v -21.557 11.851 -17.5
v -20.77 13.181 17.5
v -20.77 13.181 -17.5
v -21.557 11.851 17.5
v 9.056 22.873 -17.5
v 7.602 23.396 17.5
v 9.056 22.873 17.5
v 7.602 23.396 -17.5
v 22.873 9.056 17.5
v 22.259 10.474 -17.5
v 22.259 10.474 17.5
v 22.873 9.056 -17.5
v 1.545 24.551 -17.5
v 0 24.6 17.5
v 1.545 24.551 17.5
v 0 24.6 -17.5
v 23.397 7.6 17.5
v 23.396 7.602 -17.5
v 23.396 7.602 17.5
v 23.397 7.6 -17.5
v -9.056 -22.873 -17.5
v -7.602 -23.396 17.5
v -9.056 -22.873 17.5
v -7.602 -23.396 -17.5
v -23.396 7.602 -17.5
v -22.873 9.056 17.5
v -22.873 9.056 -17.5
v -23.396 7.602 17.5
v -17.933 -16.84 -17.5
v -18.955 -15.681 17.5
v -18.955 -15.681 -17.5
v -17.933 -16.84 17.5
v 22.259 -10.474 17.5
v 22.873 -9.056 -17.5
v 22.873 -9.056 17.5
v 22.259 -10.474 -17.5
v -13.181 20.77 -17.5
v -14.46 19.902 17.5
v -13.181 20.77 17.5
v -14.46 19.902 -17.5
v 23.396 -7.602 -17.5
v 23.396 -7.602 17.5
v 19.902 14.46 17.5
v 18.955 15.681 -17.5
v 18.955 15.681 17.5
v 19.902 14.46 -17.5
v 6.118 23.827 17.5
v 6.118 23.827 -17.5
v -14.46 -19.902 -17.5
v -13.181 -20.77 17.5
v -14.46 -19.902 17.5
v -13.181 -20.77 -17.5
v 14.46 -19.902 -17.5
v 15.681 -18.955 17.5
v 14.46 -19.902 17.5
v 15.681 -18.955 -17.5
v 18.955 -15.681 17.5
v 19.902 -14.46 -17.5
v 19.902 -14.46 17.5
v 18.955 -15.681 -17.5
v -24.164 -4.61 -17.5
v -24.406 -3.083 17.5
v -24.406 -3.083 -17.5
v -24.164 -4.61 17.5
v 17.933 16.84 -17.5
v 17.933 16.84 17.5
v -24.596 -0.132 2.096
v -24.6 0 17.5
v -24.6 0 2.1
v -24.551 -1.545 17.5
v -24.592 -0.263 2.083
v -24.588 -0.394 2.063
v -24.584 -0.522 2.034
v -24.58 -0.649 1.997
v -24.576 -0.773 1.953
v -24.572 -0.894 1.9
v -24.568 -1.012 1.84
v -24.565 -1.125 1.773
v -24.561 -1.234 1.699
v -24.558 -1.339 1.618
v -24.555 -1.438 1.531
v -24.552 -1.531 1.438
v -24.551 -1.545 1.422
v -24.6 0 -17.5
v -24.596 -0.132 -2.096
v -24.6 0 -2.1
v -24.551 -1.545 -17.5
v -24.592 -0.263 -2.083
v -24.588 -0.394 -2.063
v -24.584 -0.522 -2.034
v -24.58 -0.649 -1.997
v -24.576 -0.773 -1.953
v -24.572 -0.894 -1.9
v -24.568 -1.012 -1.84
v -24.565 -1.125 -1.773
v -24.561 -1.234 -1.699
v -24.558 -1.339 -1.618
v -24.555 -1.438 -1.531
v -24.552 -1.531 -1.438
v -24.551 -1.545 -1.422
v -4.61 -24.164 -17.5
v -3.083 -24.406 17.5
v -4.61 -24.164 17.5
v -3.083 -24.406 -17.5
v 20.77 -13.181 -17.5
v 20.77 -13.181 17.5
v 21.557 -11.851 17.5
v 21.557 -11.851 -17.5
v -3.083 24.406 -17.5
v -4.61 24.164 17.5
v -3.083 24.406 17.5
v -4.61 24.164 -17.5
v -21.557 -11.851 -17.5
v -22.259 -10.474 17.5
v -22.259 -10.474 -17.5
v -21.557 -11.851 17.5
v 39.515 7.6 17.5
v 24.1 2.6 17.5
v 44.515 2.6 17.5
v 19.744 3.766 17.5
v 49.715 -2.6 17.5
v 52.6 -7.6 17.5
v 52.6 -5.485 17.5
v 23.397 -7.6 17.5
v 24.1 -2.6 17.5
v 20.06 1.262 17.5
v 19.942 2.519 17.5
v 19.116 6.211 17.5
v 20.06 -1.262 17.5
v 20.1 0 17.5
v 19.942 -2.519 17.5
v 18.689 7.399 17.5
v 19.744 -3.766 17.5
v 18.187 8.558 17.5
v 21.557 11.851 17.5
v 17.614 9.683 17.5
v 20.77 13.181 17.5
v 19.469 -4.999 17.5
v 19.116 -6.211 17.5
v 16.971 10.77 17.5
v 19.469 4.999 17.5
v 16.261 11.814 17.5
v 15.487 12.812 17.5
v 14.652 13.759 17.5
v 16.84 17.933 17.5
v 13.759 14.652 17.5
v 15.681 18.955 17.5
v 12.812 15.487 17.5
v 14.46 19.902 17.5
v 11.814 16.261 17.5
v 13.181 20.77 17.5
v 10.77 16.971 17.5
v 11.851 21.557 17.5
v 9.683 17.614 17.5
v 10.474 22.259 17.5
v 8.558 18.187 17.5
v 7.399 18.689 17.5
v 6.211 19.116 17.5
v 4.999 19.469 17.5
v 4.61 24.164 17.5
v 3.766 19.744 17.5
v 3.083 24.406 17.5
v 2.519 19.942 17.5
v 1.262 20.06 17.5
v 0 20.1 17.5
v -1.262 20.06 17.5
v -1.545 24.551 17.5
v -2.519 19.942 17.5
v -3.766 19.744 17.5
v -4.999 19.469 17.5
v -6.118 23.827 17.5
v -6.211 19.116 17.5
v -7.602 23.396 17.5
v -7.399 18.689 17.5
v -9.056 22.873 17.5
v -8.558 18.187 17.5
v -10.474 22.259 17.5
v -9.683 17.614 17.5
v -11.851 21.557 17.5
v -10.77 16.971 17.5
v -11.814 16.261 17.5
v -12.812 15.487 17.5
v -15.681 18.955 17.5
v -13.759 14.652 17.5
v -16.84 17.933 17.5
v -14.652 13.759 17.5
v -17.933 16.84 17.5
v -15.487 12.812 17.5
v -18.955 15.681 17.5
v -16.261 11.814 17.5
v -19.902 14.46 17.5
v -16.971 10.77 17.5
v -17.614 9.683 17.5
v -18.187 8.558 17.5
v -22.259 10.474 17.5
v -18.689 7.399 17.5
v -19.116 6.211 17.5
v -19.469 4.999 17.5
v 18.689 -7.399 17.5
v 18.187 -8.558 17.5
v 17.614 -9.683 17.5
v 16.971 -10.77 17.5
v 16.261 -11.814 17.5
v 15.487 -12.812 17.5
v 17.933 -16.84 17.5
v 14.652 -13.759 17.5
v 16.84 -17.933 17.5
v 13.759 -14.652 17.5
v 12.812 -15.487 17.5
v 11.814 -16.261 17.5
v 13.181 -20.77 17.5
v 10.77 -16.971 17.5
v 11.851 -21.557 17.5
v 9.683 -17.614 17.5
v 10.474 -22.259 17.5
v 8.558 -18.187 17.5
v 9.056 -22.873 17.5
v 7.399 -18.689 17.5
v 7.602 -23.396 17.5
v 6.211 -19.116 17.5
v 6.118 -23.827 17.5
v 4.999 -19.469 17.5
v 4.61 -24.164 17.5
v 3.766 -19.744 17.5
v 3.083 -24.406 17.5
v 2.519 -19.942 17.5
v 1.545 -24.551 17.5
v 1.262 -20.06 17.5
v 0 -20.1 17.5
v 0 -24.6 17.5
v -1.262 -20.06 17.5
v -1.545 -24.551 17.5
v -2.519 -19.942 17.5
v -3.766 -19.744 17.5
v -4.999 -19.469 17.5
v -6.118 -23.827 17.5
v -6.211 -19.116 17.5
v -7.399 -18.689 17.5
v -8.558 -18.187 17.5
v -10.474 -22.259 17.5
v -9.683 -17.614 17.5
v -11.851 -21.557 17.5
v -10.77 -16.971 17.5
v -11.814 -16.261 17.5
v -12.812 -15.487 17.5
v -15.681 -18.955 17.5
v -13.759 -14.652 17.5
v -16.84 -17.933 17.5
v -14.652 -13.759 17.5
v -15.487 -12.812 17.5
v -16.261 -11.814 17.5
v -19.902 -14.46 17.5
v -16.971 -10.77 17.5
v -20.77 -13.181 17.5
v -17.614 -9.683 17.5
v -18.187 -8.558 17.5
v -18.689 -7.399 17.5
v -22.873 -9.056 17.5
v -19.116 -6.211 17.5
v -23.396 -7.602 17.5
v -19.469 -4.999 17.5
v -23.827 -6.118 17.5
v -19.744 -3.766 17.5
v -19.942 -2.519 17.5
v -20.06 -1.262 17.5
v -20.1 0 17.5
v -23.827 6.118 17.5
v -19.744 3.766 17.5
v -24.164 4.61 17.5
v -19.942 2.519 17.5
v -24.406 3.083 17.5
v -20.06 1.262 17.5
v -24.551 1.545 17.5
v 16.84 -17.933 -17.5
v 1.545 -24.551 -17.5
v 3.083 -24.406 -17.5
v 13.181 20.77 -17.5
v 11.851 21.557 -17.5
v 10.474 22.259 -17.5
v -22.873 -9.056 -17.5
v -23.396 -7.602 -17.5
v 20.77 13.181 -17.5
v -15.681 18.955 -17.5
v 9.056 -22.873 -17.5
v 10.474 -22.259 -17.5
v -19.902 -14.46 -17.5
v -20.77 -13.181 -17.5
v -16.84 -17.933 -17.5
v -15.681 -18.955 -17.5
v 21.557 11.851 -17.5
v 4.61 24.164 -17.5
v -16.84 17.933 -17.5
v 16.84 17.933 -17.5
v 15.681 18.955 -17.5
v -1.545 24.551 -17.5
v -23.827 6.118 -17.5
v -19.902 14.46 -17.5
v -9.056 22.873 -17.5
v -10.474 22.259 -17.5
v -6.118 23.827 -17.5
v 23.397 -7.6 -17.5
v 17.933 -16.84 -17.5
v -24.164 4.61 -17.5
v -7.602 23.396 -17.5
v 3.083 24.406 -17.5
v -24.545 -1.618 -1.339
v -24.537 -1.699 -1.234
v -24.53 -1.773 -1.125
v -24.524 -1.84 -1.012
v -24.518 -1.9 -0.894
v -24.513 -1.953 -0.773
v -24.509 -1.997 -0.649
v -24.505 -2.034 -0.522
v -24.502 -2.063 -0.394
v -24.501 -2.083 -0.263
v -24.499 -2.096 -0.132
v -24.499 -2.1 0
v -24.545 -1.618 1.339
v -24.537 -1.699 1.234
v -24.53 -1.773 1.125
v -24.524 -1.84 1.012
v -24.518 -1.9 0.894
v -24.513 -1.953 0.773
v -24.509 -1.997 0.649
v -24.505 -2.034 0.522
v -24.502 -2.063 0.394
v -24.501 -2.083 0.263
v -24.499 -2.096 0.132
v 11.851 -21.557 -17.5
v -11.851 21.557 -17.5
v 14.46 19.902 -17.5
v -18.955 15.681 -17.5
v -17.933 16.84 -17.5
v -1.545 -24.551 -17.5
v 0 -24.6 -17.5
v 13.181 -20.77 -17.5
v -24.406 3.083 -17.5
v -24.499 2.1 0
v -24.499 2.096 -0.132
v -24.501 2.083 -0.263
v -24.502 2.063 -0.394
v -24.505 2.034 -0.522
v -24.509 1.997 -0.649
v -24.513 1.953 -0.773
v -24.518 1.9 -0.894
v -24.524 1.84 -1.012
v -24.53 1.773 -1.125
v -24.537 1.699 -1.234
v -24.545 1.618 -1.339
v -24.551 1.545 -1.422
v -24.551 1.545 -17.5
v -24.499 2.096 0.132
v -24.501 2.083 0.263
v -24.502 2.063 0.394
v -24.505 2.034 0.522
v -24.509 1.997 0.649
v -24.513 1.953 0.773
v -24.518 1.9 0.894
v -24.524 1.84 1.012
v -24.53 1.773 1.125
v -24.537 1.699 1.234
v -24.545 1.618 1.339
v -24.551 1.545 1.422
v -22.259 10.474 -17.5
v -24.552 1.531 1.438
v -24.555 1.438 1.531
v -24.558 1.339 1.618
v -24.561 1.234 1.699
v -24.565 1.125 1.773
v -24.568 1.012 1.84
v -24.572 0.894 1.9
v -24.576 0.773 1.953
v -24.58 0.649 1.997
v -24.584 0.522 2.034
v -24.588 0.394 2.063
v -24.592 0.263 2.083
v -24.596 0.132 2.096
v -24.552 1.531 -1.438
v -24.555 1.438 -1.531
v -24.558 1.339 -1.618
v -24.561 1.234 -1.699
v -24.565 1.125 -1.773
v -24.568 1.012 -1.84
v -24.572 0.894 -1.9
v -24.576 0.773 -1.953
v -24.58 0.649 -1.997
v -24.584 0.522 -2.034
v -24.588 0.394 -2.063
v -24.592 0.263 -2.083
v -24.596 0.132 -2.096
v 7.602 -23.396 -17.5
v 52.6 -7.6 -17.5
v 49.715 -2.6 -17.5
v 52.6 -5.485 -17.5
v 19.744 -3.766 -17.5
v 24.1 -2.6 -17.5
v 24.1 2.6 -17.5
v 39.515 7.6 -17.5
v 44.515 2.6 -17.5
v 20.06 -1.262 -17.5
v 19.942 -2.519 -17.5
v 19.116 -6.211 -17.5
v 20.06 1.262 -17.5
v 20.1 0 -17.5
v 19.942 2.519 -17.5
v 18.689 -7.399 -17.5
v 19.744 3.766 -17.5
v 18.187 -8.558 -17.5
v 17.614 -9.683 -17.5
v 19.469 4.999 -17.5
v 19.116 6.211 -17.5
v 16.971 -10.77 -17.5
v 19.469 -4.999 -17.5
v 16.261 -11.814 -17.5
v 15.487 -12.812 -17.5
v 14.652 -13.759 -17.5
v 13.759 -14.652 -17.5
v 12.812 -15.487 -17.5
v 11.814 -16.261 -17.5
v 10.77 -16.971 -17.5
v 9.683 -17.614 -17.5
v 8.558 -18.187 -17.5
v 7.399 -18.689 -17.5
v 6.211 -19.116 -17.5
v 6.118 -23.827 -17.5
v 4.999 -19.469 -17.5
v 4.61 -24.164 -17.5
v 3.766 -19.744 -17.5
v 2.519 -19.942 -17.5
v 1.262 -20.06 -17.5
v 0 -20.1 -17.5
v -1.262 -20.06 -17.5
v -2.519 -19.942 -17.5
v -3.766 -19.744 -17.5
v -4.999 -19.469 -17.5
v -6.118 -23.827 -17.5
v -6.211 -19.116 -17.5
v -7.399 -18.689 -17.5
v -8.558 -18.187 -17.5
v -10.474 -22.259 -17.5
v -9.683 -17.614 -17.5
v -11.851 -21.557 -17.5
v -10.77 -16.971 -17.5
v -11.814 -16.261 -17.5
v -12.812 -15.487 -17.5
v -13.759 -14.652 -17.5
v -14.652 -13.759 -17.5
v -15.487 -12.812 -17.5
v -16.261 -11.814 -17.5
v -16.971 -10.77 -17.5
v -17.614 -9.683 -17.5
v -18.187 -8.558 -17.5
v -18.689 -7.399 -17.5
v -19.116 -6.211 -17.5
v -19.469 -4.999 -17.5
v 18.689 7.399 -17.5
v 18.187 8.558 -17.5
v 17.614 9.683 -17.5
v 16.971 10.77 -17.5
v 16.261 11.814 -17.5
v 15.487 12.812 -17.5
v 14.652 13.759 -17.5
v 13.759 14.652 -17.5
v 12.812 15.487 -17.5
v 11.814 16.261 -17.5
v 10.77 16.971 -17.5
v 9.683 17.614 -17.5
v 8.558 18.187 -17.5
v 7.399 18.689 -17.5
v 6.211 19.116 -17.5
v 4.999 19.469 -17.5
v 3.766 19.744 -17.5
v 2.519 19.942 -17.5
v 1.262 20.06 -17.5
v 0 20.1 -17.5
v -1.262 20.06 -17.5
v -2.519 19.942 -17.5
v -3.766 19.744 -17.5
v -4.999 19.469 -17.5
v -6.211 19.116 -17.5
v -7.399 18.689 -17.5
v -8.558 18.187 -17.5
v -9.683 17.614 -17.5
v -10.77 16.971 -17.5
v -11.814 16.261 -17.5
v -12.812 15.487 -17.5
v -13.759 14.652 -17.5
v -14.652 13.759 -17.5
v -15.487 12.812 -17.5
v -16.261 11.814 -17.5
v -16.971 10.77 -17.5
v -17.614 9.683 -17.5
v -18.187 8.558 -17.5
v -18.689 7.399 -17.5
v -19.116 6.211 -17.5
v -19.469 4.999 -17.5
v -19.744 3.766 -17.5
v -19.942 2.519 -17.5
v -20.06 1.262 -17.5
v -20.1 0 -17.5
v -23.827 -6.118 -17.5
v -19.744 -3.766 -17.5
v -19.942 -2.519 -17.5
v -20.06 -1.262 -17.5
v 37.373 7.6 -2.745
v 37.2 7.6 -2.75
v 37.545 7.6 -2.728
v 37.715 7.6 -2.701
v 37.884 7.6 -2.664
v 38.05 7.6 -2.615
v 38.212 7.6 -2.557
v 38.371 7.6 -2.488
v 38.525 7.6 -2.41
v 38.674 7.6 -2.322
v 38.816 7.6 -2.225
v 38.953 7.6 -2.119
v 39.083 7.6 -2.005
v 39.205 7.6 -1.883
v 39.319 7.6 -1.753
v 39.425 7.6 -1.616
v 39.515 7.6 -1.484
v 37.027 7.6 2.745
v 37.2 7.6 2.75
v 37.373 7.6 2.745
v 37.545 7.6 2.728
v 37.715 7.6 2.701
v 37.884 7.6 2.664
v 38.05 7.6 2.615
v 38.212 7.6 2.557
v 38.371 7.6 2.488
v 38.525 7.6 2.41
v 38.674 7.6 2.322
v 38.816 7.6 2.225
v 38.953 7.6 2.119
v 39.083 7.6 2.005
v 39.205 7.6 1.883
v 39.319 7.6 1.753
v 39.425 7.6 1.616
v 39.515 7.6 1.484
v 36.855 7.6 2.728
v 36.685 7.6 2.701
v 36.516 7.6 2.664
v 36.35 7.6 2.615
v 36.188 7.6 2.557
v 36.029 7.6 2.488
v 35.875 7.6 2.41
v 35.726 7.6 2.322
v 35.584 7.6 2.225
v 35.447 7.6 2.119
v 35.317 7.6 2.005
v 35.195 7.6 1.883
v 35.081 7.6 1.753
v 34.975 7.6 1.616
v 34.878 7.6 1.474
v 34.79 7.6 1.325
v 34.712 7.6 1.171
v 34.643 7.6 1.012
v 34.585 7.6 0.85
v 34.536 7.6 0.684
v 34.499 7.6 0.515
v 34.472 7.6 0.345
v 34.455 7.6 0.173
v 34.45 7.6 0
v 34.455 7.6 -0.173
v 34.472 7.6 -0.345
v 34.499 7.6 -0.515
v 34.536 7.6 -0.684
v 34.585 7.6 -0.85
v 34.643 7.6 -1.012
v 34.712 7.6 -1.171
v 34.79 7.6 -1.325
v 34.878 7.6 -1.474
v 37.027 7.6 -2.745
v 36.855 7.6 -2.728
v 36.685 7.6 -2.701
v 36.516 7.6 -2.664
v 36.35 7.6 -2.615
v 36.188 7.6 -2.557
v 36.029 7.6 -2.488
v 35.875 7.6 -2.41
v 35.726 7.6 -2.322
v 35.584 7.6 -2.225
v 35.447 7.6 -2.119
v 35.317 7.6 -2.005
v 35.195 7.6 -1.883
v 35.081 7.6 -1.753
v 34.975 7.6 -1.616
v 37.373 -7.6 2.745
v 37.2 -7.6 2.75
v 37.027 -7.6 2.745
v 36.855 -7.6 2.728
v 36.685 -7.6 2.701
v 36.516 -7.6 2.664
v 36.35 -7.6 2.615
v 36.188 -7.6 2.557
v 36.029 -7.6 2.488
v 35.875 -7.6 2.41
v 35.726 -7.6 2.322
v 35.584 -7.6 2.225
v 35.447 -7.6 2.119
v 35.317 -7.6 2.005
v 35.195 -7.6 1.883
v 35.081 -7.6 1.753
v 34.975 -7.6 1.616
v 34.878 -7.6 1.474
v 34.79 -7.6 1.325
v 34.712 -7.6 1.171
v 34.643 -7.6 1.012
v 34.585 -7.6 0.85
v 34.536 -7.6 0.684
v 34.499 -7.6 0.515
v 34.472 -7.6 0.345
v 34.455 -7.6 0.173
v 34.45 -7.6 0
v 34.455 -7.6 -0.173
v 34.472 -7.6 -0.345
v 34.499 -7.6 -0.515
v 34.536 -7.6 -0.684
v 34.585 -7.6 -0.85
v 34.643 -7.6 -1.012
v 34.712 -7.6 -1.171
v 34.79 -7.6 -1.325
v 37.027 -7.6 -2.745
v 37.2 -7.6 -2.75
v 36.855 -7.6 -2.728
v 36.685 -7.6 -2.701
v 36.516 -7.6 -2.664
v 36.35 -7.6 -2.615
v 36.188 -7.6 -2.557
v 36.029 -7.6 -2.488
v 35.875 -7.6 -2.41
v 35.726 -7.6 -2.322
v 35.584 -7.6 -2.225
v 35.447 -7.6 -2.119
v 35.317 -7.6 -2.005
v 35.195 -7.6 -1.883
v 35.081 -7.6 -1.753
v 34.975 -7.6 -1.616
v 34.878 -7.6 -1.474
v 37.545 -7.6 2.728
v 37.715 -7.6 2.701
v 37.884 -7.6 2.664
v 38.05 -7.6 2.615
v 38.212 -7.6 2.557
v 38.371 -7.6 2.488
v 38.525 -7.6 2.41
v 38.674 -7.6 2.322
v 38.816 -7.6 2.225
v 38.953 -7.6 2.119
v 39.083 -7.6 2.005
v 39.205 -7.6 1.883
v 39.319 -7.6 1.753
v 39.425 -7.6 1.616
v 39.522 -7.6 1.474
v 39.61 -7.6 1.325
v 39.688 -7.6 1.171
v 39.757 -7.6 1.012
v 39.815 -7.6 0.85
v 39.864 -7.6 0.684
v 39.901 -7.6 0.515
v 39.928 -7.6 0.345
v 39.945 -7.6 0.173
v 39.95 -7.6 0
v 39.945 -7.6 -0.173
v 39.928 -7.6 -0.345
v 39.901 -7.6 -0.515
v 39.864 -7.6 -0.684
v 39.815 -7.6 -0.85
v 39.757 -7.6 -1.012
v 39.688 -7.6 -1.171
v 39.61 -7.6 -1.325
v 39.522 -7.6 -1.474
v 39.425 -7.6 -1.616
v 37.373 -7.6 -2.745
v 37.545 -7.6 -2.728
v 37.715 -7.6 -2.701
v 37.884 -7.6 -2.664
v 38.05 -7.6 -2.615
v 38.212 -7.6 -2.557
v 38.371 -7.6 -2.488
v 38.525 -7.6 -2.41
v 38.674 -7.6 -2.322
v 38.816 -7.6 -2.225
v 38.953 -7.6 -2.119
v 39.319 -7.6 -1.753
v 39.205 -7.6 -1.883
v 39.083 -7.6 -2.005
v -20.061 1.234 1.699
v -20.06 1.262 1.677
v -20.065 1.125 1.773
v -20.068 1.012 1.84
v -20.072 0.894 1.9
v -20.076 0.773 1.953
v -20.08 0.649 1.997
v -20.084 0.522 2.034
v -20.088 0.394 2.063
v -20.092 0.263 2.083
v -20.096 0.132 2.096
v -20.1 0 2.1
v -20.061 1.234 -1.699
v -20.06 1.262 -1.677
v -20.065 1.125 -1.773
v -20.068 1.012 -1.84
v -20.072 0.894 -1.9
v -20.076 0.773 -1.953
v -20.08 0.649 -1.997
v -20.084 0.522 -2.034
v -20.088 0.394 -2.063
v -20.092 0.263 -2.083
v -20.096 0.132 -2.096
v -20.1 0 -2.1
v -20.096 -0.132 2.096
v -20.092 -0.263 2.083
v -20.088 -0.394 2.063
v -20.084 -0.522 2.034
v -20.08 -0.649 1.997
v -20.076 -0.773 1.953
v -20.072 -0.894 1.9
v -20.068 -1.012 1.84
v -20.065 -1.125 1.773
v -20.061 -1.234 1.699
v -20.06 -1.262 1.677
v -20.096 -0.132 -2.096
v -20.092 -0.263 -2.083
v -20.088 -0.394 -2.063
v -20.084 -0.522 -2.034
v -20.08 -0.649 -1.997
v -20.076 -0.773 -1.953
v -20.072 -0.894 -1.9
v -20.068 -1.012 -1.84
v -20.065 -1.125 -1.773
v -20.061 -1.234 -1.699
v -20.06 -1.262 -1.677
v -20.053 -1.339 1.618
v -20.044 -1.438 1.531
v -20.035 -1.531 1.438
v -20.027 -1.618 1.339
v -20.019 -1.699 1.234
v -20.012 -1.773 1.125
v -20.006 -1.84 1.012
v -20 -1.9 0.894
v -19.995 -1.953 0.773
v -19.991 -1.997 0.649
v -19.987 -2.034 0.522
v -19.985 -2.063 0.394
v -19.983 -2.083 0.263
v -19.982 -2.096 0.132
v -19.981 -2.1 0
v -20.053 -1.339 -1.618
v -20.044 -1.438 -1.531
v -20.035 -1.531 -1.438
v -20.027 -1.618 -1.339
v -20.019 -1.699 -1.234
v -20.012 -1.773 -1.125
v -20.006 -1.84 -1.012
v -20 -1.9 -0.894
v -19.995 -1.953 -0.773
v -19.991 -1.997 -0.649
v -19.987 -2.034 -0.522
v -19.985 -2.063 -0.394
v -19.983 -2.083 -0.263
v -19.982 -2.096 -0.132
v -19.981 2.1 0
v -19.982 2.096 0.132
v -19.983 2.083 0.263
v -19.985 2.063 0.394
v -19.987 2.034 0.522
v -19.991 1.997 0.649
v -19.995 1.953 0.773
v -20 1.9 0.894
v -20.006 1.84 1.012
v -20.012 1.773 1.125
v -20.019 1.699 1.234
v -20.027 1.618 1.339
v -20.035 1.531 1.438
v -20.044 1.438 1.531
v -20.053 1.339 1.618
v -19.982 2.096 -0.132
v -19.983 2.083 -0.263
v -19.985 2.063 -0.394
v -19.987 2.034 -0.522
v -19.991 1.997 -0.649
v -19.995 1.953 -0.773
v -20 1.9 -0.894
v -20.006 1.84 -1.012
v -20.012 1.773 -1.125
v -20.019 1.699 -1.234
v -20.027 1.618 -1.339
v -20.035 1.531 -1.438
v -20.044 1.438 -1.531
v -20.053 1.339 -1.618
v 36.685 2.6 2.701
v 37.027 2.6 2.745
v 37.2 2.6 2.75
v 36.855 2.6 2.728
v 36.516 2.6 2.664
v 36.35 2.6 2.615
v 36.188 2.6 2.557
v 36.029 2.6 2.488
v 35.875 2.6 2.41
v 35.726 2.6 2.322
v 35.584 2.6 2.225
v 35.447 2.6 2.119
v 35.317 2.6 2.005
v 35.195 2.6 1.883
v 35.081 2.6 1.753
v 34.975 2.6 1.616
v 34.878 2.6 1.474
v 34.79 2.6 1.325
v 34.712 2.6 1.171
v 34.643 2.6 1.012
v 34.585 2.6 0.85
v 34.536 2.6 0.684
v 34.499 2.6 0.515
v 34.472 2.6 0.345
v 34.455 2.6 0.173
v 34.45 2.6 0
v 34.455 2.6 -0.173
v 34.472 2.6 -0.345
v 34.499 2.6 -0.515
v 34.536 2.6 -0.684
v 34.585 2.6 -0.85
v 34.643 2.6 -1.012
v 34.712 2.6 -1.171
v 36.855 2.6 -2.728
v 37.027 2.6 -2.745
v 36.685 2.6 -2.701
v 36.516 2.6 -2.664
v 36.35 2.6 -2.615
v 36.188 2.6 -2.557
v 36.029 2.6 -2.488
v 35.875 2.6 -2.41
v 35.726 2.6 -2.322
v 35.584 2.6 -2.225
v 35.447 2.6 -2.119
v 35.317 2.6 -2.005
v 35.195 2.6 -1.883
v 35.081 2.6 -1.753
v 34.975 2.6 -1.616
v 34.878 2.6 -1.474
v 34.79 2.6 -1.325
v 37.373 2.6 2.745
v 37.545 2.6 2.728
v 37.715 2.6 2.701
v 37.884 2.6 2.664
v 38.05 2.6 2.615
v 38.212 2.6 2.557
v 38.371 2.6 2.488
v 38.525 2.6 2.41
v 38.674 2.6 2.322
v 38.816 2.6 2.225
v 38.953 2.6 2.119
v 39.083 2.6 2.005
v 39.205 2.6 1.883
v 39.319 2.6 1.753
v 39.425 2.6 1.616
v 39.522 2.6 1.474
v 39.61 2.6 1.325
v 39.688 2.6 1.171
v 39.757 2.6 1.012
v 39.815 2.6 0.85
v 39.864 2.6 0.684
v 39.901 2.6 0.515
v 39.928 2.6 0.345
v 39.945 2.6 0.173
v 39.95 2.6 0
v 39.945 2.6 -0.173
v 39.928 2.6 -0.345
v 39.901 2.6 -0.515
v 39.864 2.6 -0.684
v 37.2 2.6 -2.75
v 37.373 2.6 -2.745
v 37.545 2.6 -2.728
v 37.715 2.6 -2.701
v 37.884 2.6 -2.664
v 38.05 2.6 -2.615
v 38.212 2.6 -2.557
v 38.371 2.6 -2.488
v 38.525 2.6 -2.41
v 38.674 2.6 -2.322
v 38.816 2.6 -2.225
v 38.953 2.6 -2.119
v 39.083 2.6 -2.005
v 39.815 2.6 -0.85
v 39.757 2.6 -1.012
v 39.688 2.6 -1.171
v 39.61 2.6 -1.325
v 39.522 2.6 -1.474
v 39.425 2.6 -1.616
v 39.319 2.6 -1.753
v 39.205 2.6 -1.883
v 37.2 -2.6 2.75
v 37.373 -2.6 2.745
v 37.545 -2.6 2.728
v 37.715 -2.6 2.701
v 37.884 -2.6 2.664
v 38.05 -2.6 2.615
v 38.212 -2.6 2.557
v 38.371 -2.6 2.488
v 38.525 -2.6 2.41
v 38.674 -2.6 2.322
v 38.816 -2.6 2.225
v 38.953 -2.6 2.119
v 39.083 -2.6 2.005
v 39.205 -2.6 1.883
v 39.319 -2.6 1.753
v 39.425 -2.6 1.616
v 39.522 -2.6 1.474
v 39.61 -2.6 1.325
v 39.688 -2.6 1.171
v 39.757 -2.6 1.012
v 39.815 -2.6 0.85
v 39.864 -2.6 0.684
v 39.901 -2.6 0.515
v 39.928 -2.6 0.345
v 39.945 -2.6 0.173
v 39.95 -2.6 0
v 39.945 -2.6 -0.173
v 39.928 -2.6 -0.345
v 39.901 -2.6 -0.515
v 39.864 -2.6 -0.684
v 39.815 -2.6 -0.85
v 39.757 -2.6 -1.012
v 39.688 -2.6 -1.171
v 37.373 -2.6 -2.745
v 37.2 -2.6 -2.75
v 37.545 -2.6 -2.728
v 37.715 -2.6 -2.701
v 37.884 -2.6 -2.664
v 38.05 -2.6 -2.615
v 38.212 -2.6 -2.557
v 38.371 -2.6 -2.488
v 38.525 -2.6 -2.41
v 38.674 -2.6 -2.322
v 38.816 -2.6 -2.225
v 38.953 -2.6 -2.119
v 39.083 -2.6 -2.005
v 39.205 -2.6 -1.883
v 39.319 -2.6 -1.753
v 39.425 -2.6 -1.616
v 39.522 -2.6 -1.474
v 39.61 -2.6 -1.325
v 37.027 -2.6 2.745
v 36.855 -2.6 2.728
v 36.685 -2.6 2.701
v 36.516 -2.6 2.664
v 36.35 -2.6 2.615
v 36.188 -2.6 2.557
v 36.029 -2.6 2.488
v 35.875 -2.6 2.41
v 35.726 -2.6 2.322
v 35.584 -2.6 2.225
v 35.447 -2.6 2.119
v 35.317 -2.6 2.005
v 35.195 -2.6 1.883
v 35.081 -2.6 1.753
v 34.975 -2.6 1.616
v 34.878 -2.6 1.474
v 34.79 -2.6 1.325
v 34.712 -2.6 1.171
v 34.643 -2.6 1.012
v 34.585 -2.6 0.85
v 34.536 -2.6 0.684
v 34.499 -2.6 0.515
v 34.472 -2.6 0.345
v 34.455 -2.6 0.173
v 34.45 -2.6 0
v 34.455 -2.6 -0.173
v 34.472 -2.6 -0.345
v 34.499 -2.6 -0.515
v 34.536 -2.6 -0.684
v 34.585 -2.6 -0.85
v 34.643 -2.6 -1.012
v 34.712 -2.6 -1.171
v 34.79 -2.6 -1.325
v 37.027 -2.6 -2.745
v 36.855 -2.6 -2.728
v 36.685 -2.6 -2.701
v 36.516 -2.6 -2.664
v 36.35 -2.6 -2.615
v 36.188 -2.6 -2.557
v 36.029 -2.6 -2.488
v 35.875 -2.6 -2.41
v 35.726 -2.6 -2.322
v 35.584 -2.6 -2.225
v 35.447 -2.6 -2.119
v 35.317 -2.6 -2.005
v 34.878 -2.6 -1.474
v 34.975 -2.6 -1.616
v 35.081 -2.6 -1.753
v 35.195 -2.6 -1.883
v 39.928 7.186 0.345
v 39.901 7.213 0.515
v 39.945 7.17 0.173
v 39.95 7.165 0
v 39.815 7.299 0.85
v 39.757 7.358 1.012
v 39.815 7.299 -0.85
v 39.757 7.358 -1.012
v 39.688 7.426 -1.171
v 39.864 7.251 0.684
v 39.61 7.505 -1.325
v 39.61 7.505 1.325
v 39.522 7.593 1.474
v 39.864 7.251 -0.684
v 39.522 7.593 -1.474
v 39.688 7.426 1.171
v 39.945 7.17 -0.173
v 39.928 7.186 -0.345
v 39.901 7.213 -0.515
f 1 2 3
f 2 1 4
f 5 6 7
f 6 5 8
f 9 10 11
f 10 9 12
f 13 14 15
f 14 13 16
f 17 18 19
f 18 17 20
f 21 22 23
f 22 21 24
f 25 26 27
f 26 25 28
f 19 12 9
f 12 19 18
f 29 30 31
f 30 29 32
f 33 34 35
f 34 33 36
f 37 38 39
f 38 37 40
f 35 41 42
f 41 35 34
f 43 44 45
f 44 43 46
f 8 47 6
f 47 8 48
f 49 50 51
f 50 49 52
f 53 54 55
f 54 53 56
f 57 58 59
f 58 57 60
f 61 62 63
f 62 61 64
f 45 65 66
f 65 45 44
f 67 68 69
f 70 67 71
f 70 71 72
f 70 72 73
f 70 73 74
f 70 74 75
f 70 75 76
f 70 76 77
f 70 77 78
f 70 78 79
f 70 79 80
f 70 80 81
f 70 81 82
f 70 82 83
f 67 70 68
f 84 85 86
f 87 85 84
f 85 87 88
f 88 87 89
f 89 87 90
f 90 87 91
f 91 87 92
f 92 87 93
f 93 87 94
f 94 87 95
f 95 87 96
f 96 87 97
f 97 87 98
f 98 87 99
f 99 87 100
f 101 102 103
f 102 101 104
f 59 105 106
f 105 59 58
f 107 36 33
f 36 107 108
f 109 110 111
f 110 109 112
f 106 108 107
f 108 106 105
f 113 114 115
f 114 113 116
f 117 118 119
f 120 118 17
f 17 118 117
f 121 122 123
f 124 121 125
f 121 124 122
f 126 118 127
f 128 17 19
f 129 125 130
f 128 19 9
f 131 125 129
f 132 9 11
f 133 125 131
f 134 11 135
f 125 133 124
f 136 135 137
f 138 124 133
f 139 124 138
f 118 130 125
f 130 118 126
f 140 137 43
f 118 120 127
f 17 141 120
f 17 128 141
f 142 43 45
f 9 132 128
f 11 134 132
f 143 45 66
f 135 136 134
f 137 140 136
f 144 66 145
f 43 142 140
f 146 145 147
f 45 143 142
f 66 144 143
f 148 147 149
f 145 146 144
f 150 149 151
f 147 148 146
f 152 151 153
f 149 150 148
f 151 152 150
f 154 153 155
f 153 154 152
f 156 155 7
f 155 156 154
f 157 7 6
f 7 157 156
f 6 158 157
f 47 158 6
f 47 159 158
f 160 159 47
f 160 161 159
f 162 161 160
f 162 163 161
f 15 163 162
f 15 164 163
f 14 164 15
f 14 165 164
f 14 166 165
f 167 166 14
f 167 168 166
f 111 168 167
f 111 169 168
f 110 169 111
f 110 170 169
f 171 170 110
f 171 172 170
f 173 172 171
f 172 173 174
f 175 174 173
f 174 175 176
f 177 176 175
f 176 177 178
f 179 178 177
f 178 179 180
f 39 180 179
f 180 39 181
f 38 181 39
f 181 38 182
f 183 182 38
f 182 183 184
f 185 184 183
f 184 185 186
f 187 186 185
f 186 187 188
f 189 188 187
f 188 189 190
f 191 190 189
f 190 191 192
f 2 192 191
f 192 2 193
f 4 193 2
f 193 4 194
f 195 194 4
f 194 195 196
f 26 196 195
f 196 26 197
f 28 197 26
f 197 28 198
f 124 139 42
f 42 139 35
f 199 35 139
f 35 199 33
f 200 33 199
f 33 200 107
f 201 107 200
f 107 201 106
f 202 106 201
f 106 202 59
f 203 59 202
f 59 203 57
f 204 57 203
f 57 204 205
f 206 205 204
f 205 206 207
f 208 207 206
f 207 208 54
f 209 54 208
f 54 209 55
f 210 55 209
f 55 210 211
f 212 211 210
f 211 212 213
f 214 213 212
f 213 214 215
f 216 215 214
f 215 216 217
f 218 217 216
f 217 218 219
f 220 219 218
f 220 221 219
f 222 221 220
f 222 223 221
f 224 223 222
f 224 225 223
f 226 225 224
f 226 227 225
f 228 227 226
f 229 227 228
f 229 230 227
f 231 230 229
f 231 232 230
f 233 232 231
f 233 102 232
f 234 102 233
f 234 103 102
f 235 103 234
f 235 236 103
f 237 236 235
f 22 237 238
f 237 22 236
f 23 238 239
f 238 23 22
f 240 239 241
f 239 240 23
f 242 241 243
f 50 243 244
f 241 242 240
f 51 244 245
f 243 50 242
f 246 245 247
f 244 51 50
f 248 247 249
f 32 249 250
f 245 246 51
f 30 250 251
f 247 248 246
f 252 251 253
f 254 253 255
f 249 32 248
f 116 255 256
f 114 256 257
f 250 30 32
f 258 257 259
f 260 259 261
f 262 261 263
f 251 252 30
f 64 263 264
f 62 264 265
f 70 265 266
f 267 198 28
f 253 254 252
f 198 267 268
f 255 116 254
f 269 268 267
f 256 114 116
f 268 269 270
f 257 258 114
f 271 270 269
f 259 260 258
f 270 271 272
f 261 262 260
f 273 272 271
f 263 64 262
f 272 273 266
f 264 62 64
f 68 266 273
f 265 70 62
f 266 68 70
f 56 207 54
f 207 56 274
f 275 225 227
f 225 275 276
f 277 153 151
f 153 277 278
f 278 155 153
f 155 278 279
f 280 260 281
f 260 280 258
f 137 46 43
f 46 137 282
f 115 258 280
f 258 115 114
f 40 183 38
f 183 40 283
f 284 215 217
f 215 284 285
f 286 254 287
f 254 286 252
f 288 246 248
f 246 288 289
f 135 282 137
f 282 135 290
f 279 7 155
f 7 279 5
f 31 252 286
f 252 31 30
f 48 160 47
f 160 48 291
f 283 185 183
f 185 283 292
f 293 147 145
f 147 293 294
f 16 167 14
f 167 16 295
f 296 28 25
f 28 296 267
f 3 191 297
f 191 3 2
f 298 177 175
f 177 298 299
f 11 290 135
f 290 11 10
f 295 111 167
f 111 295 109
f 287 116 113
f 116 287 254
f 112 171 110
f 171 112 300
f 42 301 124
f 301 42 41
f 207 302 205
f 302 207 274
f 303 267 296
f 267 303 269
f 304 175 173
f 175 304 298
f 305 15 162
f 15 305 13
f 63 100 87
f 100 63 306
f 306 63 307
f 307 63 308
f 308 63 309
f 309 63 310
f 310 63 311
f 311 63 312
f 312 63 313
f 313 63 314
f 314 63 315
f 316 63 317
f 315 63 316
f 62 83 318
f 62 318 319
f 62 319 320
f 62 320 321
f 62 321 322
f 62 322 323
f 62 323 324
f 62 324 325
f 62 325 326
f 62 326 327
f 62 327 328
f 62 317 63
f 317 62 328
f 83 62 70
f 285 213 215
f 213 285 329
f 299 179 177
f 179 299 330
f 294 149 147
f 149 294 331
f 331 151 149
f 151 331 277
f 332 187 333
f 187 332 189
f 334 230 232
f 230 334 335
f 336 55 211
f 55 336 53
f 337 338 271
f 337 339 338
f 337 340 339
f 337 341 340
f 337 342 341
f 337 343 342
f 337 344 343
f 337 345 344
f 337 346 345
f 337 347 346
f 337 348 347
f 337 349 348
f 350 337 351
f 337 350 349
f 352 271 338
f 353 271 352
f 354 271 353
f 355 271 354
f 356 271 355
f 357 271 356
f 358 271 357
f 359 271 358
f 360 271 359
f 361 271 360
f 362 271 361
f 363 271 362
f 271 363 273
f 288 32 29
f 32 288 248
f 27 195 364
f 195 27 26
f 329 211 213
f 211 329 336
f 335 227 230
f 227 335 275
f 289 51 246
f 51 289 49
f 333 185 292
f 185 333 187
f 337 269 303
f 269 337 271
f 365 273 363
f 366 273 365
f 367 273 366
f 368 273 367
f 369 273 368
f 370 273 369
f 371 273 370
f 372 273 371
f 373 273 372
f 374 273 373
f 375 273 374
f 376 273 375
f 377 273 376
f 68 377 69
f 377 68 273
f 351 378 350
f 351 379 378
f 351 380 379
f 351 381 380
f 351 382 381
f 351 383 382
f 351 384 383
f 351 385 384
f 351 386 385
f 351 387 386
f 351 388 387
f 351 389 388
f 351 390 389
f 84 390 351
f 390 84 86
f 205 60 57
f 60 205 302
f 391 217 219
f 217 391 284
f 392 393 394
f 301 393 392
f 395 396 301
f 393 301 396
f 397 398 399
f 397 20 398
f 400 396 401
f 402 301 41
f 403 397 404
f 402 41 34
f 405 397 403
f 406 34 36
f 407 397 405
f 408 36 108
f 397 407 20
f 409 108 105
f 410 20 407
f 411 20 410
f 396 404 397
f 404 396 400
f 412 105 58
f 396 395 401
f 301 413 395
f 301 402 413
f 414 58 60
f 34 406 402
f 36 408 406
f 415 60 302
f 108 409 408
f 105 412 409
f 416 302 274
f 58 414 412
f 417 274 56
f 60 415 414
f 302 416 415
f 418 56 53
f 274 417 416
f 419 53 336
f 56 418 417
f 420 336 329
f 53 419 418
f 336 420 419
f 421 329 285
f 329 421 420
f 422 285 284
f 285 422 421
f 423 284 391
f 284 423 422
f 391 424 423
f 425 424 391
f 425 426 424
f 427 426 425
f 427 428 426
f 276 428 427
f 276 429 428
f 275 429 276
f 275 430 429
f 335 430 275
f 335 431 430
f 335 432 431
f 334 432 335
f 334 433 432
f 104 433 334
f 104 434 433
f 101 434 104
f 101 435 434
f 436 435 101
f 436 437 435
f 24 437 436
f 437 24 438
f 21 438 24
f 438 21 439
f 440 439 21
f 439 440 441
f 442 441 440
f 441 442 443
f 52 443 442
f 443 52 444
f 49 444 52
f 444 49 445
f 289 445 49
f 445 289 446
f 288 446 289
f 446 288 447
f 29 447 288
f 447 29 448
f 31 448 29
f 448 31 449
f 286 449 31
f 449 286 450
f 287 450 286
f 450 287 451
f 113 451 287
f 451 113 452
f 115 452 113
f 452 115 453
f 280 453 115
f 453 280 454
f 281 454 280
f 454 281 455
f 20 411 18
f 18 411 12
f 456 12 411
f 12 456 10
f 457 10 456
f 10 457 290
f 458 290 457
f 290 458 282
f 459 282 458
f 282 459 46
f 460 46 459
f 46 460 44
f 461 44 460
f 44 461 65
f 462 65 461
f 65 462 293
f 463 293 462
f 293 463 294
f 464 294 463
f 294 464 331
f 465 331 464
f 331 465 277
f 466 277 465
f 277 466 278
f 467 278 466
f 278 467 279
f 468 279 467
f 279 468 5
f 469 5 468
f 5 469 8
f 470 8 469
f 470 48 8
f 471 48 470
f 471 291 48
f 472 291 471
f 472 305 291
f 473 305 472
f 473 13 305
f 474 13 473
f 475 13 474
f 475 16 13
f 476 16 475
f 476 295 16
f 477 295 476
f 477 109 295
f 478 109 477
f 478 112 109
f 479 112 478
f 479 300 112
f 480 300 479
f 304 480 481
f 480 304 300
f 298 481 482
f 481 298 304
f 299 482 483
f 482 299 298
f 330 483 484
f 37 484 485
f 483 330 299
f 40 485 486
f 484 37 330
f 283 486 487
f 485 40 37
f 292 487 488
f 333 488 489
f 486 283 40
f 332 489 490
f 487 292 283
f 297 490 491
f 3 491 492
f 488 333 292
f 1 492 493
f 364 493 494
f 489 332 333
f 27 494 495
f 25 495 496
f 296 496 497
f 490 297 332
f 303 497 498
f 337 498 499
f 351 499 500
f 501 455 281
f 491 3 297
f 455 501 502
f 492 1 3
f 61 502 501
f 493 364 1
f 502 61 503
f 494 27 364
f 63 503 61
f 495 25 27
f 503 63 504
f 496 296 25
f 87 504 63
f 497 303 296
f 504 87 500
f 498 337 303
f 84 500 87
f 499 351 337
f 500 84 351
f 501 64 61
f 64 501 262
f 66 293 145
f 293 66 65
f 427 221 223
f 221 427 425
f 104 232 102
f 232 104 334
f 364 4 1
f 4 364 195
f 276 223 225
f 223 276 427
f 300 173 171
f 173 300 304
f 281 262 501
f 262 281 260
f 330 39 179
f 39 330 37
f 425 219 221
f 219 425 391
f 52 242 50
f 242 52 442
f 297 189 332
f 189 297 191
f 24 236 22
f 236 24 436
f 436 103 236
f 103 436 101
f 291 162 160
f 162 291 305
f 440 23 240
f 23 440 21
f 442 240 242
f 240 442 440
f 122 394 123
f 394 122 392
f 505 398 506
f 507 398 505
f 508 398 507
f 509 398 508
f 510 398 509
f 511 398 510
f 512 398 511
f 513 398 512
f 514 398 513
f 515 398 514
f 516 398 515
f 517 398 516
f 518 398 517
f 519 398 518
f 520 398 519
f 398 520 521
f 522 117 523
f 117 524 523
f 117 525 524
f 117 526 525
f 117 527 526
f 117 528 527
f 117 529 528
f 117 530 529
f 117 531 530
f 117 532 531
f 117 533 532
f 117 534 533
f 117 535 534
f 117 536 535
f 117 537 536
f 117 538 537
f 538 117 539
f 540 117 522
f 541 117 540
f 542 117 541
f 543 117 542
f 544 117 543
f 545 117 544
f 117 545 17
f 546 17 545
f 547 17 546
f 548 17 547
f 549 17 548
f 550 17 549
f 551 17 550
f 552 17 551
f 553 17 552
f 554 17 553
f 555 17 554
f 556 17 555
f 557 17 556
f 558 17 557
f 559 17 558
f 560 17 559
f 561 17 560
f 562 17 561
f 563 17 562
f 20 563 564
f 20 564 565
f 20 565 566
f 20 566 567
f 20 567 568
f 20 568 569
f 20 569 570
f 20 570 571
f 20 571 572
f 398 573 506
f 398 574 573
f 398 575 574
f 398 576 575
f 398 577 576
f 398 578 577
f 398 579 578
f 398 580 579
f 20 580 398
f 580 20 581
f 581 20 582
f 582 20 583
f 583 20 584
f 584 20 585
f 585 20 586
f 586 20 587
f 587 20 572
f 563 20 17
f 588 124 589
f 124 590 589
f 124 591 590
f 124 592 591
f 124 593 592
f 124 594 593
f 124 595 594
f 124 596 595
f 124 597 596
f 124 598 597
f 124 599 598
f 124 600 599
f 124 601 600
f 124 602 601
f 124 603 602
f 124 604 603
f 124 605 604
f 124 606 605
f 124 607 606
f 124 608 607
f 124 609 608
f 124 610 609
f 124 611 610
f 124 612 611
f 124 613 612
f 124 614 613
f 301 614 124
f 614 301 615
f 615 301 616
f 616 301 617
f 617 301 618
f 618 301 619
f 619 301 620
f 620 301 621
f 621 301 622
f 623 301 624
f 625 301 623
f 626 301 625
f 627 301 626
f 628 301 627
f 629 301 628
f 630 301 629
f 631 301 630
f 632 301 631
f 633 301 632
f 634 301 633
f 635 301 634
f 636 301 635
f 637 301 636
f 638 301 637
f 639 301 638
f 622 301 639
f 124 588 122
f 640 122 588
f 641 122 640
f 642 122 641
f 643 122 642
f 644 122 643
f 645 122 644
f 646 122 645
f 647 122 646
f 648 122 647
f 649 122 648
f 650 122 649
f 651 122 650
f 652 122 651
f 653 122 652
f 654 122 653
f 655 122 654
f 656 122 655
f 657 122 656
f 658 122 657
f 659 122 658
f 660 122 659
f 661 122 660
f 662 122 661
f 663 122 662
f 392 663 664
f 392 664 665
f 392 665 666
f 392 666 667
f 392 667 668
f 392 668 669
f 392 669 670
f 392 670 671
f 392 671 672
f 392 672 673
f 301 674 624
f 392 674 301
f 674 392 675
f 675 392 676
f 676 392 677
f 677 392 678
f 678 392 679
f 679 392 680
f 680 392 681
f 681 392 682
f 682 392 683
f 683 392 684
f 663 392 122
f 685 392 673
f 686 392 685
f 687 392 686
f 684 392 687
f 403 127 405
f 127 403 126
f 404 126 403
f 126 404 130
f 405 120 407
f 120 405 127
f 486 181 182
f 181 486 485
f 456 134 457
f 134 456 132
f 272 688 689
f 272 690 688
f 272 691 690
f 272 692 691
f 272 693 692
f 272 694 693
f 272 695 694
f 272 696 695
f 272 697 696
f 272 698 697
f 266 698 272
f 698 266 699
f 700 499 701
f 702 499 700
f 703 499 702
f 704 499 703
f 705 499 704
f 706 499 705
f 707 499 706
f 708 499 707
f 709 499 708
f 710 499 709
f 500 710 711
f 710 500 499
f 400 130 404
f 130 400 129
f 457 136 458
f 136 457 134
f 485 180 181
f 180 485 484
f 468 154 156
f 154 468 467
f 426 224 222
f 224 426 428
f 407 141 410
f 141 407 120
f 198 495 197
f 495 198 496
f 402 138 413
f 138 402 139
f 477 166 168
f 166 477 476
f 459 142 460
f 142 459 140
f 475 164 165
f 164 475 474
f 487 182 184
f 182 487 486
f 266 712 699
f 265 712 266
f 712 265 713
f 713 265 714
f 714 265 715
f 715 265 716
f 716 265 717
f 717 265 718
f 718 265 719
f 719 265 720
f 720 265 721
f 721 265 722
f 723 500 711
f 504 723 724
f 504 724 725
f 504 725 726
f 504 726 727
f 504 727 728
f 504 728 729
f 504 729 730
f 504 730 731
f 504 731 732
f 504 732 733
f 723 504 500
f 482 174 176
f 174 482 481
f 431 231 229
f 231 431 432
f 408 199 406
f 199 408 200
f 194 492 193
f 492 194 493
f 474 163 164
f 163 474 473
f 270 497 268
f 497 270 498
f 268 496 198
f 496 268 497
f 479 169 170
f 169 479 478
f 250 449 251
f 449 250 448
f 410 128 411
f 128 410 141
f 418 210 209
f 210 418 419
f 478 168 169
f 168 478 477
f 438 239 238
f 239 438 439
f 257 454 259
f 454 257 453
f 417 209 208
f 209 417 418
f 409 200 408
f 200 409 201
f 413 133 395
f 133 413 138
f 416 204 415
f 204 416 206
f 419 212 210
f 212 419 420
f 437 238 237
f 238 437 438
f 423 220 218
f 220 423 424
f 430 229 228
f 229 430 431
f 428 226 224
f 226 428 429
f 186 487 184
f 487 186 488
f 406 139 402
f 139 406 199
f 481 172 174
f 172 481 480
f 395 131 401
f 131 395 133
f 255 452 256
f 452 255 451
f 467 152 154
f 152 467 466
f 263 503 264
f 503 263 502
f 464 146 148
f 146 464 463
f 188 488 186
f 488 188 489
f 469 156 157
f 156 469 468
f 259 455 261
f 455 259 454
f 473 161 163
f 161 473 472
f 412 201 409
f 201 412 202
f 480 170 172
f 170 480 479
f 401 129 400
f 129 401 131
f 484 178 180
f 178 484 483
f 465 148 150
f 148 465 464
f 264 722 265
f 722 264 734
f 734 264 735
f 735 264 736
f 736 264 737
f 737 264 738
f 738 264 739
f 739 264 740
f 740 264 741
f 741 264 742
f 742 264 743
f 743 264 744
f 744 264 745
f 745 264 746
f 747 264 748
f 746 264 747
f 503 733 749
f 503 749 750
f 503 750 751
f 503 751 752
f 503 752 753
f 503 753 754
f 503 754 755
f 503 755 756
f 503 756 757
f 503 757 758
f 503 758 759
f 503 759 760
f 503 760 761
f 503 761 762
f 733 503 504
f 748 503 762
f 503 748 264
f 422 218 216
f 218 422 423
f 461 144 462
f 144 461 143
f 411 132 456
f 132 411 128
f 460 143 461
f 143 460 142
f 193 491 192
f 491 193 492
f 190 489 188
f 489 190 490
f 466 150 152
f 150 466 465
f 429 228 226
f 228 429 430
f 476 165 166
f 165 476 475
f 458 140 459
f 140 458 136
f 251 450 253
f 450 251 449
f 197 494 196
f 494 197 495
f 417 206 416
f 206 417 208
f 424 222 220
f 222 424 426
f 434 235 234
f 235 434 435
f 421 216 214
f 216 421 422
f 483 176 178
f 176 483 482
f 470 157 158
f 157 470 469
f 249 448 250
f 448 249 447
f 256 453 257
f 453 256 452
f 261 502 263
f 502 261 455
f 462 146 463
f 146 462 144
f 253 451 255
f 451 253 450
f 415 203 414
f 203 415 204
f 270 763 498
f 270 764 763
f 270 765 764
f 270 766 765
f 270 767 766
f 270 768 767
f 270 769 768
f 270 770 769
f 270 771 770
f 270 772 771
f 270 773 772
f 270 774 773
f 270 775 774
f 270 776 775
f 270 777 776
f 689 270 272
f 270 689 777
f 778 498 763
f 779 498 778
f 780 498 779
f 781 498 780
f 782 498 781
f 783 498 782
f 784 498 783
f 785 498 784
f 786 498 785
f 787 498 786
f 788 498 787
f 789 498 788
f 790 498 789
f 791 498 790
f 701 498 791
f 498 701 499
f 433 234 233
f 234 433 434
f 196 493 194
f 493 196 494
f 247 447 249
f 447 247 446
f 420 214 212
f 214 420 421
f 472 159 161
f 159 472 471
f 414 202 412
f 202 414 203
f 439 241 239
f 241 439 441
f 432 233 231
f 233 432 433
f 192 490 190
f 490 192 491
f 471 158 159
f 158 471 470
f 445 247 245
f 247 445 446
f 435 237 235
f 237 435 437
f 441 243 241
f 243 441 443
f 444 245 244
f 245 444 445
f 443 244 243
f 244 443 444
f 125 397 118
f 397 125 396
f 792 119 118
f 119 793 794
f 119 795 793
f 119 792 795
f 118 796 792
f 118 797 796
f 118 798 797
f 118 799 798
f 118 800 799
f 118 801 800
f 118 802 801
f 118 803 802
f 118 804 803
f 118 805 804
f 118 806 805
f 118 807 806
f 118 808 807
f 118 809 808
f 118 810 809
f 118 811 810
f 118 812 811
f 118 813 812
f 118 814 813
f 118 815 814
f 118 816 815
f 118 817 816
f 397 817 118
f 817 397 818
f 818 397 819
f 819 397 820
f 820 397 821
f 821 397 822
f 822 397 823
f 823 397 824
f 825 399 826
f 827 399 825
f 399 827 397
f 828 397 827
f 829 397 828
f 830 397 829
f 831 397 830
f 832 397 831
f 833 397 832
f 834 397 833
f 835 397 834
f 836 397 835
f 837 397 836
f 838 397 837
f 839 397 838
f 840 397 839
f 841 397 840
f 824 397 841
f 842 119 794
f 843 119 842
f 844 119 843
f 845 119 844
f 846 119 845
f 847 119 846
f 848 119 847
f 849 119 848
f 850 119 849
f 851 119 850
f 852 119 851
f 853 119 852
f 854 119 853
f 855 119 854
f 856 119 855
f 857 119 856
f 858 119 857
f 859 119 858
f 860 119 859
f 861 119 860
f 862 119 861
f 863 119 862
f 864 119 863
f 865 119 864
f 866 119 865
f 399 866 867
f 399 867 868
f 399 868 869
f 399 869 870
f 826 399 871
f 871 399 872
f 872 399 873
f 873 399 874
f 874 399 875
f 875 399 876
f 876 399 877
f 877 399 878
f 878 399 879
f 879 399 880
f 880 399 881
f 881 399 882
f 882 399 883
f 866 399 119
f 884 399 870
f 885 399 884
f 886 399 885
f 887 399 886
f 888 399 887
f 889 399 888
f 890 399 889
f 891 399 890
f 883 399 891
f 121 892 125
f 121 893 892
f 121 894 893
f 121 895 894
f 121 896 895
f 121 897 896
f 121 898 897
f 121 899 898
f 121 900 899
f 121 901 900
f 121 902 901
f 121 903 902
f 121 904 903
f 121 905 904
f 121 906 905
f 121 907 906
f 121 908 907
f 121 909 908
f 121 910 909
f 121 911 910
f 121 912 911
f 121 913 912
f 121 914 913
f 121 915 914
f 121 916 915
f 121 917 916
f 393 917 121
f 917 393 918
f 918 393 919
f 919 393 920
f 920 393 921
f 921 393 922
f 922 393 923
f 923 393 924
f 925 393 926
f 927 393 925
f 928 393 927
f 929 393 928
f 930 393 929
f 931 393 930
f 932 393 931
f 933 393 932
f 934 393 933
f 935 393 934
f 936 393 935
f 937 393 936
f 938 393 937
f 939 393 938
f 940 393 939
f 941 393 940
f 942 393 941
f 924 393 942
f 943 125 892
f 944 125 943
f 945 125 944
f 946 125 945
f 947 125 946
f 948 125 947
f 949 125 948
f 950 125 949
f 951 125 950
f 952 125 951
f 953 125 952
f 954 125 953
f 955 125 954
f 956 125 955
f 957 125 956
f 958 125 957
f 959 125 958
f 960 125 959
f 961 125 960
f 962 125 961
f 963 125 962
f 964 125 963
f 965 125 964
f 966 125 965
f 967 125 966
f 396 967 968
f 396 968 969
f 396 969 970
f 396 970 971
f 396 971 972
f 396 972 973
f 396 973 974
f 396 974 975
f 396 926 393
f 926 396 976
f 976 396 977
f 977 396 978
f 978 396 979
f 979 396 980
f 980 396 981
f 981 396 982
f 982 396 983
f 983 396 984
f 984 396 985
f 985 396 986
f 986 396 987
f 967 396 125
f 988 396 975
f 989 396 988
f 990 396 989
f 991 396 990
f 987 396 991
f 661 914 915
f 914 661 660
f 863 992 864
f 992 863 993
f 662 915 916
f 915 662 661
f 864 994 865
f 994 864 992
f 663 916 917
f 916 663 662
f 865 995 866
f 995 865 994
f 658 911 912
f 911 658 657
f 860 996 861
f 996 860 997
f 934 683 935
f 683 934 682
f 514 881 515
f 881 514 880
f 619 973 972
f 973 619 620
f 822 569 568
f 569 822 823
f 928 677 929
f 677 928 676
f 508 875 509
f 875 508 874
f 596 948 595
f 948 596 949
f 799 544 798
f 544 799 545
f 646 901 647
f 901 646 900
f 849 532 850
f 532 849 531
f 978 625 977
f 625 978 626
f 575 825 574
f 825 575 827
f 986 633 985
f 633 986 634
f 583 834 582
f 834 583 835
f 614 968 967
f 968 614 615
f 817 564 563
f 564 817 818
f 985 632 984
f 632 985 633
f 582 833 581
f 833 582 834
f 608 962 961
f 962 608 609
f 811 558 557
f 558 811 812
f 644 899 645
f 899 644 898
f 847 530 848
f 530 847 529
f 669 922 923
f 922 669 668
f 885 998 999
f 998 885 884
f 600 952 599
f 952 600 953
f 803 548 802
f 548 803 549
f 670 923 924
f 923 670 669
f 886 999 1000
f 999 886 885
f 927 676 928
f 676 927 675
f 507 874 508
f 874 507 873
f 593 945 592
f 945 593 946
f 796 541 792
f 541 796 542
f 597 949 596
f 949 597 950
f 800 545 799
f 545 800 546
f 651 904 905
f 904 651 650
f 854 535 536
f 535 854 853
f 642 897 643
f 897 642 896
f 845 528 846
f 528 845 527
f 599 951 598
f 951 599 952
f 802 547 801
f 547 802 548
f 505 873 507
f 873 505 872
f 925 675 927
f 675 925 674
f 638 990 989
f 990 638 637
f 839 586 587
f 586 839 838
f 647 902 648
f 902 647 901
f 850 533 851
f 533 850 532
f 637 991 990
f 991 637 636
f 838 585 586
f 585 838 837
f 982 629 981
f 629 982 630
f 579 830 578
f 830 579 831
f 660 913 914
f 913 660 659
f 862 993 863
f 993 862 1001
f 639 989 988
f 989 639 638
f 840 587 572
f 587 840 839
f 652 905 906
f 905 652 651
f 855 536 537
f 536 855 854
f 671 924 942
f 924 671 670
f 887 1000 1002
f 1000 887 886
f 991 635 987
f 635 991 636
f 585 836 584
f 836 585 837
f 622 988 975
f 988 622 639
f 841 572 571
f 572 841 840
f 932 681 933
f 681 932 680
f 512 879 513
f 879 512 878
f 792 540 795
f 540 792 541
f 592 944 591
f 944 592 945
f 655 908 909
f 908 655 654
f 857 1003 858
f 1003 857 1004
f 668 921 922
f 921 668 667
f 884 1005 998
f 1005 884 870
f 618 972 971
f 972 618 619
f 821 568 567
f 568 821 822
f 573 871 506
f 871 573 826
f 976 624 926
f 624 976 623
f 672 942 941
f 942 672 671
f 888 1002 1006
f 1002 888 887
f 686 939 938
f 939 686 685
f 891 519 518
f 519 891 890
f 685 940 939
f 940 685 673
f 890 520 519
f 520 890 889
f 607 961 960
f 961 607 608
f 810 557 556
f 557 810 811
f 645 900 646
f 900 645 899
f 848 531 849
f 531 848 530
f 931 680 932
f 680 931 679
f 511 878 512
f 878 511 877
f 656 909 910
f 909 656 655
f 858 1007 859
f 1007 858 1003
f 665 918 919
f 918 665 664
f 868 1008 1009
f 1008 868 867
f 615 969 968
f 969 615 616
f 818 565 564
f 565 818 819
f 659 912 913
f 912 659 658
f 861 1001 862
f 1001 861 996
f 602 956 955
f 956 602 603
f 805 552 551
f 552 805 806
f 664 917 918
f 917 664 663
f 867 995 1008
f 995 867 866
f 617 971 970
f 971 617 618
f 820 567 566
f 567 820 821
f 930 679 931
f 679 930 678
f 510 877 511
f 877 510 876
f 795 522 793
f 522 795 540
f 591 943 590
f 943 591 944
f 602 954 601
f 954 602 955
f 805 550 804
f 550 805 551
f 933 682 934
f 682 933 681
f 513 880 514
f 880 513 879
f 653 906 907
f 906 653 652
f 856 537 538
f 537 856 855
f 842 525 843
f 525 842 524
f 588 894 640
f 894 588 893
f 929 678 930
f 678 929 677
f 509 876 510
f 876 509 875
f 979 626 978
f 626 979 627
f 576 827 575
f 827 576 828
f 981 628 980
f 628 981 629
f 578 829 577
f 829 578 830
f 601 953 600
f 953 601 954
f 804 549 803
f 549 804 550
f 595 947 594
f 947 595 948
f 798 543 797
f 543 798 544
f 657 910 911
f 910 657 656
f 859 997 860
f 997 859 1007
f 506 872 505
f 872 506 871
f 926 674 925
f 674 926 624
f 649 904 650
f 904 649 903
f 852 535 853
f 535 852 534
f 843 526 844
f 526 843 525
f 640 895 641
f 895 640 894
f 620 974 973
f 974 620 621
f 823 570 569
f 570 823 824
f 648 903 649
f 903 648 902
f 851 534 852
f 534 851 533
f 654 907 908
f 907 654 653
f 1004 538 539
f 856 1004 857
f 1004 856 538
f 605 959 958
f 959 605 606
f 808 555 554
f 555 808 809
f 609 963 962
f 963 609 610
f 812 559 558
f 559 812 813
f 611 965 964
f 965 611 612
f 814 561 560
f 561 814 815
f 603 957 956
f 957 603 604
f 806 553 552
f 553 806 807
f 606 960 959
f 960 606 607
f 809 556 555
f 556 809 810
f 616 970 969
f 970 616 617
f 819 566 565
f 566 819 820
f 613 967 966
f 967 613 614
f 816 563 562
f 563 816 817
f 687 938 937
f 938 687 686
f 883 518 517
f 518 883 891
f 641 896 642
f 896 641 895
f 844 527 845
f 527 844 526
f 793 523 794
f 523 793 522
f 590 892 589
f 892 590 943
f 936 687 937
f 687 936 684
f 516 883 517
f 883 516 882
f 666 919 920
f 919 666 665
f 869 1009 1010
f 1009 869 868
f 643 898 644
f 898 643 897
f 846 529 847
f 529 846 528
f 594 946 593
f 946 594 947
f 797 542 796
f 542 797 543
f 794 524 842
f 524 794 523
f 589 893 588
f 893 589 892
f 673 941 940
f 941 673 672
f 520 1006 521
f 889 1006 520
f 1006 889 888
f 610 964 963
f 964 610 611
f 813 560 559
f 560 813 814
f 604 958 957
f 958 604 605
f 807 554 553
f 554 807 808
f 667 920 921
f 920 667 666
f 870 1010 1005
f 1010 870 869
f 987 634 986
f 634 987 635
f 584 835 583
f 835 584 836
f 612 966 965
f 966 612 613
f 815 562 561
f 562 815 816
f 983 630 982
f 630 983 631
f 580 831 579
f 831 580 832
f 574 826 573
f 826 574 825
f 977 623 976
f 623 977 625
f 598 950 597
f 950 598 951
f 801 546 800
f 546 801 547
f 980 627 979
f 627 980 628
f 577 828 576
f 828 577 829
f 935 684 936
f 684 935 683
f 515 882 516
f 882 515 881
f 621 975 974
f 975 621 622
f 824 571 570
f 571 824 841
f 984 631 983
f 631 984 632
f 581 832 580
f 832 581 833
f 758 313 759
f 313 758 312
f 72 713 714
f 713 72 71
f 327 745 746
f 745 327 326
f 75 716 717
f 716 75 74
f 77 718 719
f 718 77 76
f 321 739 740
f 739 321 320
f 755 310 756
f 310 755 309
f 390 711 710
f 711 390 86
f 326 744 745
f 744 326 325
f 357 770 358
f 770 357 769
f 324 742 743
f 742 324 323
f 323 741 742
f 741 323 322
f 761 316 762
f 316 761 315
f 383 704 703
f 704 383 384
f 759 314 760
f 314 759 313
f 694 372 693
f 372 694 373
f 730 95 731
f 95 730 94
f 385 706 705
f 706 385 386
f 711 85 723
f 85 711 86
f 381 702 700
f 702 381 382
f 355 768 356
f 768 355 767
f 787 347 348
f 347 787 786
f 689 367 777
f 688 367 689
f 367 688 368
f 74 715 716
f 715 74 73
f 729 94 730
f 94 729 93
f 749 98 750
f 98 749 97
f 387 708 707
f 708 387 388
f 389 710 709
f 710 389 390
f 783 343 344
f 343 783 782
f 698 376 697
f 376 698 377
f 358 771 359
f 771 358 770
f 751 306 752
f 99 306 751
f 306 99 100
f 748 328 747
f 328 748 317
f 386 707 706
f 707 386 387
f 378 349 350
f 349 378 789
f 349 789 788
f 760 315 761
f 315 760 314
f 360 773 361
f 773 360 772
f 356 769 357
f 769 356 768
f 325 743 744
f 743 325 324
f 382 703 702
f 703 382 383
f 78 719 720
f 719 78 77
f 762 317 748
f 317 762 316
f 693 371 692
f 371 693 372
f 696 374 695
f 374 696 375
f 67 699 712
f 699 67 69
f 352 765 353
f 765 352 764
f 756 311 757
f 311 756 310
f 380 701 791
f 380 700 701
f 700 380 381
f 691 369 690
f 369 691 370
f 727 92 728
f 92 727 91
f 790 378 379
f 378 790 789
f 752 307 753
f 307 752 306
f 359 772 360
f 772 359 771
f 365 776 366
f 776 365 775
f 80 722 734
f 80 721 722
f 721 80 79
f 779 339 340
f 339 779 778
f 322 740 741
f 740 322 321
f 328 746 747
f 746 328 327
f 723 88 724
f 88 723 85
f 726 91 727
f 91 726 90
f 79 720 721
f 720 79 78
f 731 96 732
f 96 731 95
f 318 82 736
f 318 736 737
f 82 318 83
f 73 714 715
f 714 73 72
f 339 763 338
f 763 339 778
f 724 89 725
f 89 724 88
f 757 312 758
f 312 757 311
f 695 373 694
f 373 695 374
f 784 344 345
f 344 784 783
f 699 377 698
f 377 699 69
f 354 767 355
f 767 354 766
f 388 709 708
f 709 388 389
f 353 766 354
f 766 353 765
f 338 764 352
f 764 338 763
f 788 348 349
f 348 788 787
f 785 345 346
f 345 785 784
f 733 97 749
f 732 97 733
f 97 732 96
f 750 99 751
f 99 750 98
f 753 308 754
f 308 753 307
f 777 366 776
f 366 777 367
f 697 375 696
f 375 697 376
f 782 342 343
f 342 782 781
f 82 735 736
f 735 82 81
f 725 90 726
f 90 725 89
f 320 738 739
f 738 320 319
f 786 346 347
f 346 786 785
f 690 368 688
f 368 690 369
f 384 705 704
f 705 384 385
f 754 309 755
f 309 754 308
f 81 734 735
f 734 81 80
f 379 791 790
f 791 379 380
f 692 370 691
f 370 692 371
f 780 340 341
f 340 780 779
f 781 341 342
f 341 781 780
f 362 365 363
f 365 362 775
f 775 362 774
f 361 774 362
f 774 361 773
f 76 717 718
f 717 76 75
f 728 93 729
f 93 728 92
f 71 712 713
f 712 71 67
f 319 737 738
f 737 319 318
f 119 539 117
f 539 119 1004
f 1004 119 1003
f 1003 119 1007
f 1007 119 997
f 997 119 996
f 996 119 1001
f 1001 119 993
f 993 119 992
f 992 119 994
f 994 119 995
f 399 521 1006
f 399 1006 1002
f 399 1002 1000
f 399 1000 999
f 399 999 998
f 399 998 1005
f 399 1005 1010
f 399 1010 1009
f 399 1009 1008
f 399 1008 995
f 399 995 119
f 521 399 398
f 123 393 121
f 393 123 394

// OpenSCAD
/*
 * Modulares OpenSCAD Modell: Muffe 2 (Doppel-Lasche)
 * Variante: Durchgehende Muffe mit Doppel-Lasche (Gabelaufnahme für 5mm Scheibe).
 */

$fn = 100;

// --- PARAMETER ---
rohr_nennmass = 40.0;                         // 20, 25, 30, 40 mm
toleranz = 0.2;
innen_durchmesser = rohr_nennmass + toleranz;
wanddicke = (rohr_nennmass <= 25) ? 3.5 : (rohr_nennmass <= 30) ? 4.0 : 4.5;
aussen_durchmesser = innen_durchmesser + (wanddicke * 2);
muffen_laenge = max(24.0, round(rohr_nennmass * 0.875));

// Doppel-Laschen (Aufnahme für die Scheibe)
scheiben_dicke = 5.0;
spalt_breite = scheiben_dicke + 0.2;          // 5.2mm für leichtes Einschieben
laschen_dicke = (rohr_nennmass <= 25) ? 4.0 : 5.0;
laschen_ausladung = max(20.0, round(rohr_nennmass * 0.7));

// Bohrungen
loch_durchmesser_laschen = (rohr_nennmass <= 25) ? 5.2 : 5.5;
loch_abstand_von_mitte = (aussen_durchmesser / 2) + (laschen_ausladung * 0.45);
loch_durchmesser_rohr = (rohr_nennmass <= 25) ? 3.2 : 4.2;

// --- HAUPTBAUGRUPPE ---
rohrverbinder_getrennte_befestigung();

module rohrverbinder_getrennte_befestigung() {
    difference() {
        grundform();
        aussparung_rohr();
        aussparung_spalt();
        bohrung_fuer_laschen();
        bohrung_fuer_rohr_madenschraube();
        kantenabrundung_laschen();
    }
}

module grundform() {
    union() {
        cylinder(d=aussen_durchmesser, h=muffen_laenge, center=true);
        translate([(aussen_durchmesser/2) + (laschen_ausladung/2) - 2, 0, 0])
            cube([laschen_ausladung + 4, spalt_breite + (laschen_dicke * 2), muffen_laenge], center=true);
    }
}

module aussparung_rohr() {
    cylinder(d=innen_durchmesser, h=muffen_laenge + 2, center=true);
}

module aussparung_spalt() {
    translate([(aussen_durchmesser/2) + (laschen_ausladung/2) + wanddicke, 0, 0])
        cube([laschen_ausladung + 10, spalt_breite, muffen_laenge + 2], center=true);
}

module bohrung_fuer_laschen() {
    translate([loch_abstand_von_mitte, 0, 0])
        rotate([90, 0, 0])
        cylinder(d=loch_durchmesser_laschen, h=spalt_breite + (laschen_dicke * 2) + 10, center=true);
}

module bohrung_fuer_rohr_madenschraube() {
    translate([-aussen_durchmesser/2, 0, 0])
        rotate([0, 90, 0])
        cylinder(d=loch_durchmesser_rohr, h=wanddicke + 5, center=true);
}

module kantenabrundung_laschen() {
    translate([(aussen_durchmesser/2) + laschen_ausladung + 3, 0, 0])
        rotate([0, 0, 45])
        cube([12, 35, muffen_laenge + 2], center=true);
}
